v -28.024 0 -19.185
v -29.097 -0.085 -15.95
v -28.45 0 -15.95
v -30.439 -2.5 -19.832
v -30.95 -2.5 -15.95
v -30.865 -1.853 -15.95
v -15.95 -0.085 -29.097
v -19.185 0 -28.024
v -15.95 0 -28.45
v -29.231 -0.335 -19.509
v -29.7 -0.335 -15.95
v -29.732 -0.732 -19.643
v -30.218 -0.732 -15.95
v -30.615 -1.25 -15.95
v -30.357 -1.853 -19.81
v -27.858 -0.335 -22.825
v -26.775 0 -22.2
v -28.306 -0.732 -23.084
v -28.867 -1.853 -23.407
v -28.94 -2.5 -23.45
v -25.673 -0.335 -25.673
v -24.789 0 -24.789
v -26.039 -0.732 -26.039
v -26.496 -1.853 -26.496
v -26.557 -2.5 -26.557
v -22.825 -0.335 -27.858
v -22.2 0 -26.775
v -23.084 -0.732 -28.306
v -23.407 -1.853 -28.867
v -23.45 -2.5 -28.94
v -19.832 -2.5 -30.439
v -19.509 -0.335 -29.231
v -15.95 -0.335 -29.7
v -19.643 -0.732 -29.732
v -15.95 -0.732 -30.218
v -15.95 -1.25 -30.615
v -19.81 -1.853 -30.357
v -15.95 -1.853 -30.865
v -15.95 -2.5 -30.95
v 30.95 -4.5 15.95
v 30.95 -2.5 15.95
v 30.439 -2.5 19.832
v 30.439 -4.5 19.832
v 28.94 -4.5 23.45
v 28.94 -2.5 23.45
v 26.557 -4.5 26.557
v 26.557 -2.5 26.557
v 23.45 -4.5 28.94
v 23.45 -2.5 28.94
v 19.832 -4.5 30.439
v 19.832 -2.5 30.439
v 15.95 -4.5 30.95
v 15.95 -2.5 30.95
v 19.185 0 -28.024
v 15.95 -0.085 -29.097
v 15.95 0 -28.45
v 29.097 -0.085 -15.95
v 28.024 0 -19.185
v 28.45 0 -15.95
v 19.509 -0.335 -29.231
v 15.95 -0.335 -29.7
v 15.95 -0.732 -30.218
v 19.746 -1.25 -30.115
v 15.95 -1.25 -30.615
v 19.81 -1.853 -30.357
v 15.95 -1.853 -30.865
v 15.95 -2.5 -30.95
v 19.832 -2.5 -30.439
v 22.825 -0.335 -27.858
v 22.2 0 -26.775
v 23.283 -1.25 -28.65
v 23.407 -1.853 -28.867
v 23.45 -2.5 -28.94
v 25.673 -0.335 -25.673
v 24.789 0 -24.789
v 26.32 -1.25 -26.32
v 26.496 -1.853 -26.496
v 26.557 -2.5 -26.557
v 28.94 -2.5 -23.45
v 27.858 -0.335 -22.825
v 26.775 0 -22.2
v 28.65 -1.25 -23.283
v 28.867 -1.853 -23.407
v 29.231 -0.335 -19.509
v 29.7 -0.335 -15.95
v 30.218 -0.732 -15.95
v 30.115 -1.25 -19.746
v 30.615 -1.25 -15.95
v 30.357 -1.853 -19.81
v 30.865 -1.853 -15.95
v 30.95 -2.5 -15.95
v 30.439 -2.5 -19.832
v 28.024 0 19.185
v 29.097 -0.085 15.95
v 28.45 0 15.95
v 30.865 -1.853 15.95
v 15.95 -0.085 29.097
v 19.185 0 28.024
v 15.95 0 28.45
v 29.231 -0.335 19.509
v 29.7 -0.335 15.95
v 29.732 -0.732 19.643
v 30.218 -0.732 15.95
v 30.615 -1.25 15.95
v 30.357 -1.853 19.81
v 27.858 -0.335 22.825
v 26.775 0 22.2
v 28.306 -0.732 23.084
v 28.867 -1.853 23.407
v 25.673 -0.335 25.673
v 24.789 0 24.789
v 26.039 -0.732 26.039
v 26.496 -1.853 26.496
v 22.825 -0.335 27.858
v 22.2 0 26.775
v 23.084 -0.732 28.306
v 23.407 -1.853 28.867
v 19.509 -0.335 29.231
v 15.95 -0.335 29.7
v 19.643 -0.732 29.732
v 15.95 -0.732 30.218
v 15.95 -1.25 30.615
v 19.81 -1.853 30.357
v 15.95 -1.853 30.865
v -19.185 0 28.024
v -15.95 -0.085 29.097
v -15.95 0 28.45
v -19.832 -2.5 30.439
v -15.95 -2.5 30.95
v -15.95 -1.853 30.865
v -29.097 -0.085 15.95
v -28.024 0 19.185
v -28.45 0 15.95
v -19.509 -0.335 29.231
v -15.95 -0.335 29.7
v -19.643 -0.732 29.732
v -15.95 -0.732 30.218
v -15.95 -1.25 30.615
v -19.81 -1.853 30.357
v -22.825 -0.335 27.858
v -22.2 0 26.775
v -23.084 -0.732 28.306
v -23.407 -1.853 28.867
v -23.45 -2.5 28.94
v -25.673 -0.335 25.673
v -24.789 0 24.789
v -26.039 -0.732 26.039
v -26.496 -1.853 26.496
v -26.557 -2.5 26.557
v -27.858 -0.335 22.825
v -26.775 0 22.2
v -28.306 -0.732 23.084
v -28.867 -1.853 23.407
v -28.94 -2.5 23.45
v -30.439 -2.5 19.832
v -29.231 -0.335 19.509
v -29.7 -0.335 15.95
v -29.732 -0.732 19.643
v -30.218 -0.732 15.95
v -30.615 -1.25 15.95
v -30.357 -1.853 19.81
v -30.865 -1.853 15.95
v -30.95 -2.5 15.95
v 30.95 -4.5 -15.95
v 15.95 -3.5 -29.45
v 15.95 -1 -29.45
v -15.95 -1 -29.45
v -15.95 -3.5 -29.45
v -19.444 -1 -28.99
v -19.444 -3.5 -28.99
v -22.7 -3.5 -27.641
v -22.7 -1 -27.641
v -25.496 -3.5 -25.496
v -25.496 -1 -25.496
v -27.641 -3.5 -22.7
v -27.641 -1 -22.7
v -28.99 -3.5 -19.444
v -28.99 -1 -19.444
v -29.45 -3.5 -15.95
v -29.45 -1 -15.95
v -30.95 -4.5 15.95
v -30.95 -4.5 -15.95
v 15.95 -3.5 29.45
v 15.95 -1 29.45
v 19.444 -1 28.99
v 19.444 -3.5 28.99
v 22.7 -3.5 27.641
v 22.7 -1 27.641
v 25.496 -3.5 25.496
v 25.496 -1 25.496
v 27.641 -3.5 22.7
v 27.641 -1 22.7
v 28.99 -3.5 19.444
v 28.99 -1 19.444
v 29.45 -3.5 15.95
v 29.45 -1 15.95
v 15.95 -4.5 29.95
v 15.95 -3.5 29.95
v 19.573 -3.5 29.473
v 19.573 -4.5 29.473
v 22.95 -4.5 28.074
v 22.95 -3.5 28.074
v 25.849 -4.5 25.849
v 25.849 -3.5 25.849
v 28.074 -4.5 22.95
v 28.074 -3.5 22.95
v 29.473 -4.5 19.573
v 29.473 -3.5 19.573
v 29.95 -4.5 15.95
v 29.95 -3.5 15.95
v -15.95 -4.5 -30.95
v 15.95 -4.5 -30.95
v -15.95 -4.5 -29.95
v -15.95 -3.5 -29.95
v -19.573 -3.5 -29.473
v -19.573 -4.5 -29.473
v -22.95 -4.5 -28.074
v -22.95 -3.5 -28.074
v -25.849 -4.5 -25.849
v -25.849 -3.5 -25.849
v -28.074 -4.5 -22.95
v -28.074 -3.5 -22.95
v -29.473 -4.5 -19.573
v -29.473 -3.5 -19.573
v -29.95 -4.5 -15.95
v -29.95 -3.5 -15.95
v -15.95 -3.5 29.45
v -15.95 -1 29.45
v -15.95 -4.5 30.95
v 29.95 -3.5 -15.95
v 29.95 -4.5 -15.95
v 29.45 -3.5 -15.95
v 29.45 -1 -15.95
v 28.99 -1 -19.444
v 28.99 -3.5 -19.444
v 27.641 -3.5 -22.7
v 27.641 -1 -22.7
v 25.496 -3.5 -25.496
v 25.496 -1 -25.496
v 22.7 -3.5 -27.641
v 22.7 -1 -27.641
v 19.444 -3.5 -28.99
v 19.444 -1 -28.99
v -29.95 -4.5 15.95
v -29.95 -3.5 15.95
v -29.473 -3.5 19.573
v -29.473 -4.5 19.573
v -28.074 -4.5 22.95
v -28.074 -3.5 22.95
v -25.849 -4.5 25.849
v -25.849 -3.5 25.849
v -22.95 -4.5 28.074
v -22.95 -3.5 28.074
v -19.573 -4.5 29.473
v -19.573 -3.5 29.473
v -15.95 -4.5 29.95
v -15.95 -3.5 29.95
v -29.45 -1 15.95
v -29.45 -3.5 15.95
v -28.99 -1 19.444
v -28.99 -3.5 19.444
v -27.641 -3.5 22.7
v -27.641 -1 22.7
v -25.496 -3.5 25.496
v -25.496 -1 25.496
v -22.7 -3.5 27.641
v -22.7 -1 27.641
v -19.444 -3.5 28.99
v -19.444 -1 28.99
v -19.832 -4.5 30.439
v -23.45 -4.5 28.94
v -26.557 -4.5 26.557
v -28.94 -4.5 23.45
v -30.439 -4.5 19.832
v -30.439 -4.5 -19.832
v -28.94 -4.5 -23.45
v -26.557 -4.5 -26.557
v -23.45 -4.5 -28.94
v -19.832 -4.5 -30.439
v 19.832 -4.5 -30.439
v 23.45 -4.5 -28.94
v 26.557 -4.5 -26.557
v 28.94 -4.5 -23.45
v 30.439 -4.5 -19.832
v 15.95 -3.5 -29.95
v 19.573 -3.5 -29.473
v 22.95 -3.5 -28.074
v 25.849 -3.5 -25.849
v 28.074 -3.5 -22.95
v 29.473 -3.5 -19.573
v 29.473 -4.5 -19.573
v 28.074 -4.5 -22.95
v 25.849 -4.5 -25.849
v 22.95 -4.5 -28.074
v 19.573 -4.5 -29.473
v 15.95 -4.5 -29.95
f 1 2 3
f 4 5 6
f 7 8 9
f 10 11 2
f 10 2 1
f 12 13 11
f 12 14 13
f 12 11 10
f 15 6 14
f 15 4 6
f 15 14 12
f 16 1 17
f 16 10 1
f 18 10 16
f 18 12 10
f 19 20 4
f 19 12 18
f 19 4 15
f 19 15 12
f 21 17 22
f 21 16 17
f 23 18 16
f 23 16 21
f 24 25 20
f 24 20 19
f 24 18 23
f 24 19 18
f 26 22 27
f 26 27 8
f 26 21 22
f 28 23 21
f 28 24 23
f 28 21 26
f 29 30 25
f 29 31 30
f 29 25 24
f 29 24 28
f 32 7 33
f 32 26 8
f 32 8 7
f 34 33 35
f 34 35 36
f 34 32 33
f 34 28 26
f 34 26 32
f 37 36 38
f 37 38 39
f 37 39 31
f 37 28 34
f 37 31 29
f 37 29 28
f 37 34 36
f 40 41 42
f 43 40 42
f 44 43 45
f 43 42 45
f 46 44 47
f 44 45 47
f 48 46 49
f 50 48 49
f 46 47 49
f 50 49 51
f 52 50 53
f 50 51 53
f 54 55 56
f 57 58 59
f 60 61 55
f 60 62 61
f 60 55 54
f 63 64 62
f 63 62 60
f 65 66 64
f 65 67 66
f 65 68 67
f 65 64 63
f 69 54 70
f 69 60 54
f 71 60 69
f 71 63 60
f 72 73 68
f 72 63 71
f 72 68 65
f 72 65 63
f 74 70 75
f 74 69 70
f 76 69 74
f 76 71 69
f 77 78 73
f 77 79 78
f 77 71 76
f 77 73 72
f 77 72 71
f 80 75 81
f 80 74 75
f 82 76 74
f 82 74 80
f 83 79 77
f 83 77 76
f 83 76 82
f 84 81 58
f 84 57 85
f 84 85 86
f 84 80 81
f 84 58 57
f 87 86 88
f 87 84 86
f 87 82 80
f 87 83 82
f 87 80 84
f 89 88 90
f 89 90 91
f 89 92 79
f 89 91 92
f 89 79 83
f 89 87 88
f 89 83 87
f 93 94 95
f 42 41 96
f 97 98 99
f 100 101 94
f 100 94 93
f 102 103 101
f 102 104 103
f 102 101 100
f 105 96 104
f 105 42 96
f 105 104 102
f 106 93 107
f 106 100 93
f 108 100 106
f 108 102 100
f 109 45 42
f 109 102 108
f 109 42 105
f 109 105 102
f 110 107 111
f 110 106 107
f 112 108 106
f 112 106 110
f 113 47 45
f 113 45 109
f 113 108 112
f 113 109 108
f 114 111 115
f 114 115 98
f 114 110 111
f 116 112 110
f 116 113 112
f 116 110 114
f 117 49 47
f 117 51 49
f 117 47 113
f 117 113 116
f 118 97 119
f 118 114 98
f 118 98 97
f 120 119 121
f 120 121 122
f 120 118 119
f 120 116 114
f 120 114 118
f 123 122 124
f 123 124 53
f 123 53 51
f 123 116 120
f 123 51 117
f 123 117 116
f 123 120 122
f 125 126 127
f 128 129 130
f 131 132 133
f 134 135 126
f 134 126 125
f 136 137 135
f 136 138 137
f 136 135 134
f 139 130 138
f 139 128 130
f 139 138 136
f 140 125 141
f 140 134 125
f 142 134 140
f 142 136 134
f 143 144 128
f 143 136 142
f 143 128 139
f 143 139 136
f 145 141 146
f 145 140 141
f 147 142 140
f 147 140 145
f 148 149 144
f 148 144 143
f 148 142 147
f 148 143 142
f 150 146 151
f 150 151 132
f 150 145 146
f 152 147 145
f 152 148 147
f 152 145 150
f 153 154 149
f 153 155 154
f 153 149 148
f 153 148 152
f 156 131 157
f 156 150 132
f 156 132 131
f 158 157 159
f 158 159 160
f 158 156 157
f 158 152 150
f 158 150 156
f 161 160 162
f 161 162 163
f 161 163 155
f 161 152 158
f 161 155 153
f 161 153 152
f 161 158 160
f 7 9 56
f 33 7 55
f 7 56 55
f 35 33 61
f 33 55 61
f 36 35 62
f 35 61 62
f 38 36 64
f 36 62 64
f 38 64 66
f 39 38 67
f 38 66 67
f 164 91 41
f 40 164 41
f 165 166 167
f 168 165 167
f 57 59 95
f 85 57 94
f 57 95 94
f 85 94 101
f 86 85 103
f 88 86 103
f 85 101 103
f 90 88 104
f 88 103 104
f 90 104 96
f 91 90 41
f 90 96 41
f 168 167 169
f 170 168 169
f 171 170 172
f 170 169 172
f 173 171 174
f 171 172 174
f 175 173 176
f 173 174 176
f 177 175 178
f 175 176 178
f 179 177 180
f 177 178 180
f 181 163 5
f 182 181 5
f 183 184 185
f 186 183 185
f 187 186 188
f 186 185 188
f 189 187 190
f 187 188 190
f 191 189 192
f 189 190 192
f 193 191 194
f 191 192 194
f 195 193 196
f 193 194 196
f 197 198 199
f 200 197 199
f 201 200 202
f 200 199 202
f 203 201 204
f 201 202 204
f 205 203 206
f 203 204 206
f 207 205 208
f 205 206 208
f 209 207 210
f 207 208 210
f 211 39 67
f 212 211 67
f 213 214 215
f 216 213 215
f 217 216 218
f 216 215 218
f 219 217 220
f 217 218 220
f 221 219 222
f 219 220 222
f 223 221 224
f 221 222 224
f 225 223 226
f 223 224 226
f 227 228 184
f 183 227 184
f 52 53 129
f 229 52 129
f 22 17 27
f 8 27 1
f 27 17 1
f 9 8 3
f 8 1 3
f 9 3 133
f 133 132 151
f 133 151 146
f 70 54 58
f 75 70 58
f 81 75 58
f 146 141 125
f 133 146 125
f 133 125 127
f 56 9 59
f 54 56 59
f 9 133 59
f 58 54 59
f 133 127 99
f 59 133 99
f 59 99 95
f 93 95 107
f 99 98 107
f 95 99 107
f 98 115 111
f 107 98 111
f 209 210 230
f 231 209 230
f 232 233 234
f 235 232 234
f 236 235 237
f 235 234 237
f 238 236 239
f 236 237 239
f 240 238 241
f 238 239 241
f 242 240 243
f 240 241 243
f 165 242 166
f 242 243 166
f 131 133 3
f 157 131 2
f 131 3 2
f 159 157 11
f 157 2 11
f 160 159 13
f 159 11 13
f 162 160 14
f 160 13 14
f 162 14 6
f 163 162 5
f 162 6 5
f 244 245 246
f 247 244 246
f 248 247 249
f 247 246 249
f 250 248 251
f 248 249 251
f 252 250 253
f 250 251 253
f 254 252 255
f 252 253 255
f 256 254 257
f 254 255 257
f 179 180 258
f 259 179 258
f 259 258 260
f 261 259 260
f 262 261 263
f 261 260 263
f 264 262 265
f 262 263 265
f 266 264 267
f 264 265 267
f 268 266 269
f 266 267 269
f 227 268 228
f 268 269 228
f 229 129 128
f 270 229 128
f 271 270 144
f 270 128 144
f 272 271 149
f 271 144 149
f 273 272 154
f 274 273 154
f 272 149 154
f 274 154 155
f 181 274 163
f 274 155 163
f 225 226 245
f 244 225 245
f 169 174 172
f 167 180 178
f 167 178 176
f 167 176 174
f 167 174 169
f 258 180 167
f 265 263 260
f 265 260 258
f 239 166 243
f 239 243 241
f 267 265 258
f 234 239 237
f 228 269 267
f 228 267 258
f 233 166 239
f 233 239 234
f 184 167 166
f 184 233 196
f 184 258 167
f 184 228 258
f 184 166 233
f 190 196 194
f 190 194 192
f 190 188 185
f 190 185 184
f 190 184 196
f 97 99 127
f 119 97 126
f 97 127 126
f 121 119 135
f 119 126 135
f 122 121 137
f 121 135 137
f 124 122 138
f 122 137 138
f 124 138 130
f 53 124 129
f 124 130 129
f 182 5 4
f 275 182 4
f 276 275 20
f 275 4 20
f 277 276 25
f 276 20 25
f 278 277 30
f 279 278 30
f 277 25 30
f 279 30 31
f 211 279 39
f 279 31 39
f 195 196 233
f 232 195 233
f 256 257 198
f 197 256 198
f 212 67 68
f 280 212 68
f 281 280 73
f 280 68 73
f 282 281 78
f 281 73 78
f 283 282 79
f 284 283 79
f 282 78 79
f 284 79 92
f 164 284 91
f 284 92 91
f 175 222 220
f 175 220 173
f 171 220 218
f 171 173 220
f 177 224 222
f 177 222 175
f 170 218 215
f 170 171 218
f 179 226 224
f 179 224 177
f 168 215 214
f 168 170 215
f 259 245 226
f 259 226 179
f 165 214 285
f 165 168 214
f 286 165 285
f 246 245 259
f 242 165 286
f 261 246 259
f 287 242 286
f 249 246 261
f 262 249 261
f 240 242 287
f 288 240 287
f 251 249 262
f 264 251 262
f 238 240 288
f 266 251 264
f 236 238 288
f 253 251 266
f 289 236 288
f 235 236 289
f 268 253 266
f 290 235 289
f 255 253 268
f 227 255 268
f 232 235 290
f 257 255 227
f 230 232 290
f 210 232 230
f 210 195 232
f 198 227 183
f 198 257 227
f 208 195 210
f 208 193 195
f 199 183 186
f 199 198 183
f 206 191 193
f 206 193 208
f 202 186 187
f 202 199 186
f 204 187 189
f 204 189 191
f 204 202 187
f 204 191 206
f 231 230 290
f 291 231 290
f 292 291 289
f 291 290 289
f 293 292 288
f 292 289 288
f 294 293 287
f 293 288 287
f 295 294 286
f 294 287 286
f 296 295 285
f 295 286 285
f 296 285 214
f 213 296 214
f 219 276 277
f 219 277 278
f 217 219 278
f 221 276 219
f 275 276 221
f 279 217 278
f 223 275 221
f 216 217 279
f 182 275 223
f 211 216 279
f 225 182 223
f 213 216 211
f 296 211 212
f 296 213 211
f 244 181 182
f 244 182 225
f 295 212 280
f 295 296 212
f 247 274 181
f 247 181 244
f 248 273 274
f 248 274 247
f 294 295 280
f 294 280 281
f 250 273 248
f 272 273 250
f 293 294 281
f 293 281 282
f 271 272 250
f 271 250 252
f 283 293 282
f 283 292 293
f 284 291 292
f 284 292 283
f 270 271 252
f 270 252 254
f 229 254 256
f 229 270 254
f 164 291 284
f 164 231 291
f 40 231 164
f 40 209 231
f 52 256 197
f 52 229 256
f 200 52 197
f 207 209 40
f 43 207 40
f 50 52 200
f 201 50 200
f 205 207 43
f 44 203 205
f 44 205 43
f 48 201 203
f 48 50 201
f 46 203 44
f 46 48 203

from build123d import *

# Parameters (mm, degrees)
F1_DEPTH = 4.5
F2_DEPTH = 3.5
F3_DEPTH = 1
F4_R     = 2.5


with BuildPart() as f1:
    # F0 (on Front) → F1 (new body)
    with BuildSketch(Plane.XZ):
        with BuildLine():
            Line((15.95, 30.95), (-15.95, 30.95))
            ThreePointArc((-15.95, 30.95), (-26.556602, 26.556602), (-30.95, 15.95))
            Line((-30.95, 15.95), (-30.95, -15.95))
            ThreePointArc((-30.95, -15.95), (-26.556602, -26.556602), (-15.95, -30.95))
            Line((-15.95, -30.95), (15.95, -30.95))
            ThreePointArc((15.95, -30.95), (26.556602, -26.556602), (30.95, -15.95))
            Line((30.95, -15.95), (30.95, 15.95))
            ThreePointArc((30.95, 15.95), (26.556602, 26.556602), (15.95, 30.95))
        make_face()
        with BuildLine():
            ThreePointArc((-29.949999, 15.95), (-25.849494, 25.849494), (-15.95, 29.949999))
            Line((-15.95, 29.949999), (15.95, 29.949999))
            ThreePointArc((15.95, 29.949999), (25.849494, 25.849494), (29.949999, 15.95))
            Line((29.949999, 15.95), (29.949999, -15.95))
            ThreePointArc((29.949999, -15.95), (25.849494, -25.849494), (15.95, -29.949999))
            Line((15.95, -29.949999), (-15.95, -29.949999))
            ThreePointArc((-15.95, -29.949999), (-25.849494, -25.849494), (-29.949999, -15.95))
            Line((-29.949999, -15.95), (-29.949999, 15.95))
        make_face(mode=Mode.SUBTRACT)
    extrude(amount=F1_DEPTH)

    # F0 (on Front) → F2 (join)
    with BuildSketch(Plane.XZ):
        with BuildLine():
            Line((15.95, 29.949999), (-15.95, 29.949999))
            ThreePointArc((-15.95, 29.949999), (-25.849494, 25.849494), (-29.949999, 15.95))
            Line((-29.949999, 15.95), (-29.949999, -15.95))
            ThreePointArc((-29.949999, -15.95), (-25.849494, -25.849494), (-15.95, -29.949999))
            Line((-15.95, -29.949999), (15.95, -29.949999))
            ThreePointArc((15.95, -29.949999), (25.849494, -25.849494), (29.949999, -15.95))
            Line((29.949999, -15.95), (29.949999, 15.95))
            ThreePointArc((29.949999, 15.95), (25.849494, 25.849494), (15.95, 29.949999))
        make_face()
        with BuildLine():
            ThreePointArc((-29.45, 15.95), (-25.495942, 25.495942), (-15.95, 29.45))
            Line((-15.95, 29.45), (15.95, 29.45))
            ThreePointArc((15.95, 29.45), (25.495942, 25.495942), (29.45, 15.95))
            Line((29.45, 15.95), (29.45, -15.95))
            ThreePointArc((29.45, -15.95), (25.495942, -25.495942), (15.95, -29.45))
            Line((15.95, -29.45), (-15.95, -29.45))
            ThreePointArc((-15.95, -29.45), (-25.495942, -25.495942), (-29.45, -15.95))
            Line((-29.45, -15.95), (-29.45, 15.95))
        make_face(mode=Mode.SUBTRACT)
    extrude(amount=F2_DEPTH)

    # F0 (on Front) → F3 (join)
    with BuildSketch(Plane.XZ):
        with BuildLine():
            Line((15.95, 29.45), (-15.95, 29.45))
            ThreePointArc((-15.95, 29.45), (-25.495942, 25.495942), (-29.45, 15.95))
            Line((-29.45, 15.95), (-29.45, -15.95))
            ThreePointArc((-29.45, -15.95), (-25.495942, -25.495942), (-15.95, -29.45))
            Line((-15.95, -29.45), (15.95, -29.45))
            ThreePointArc((15.95, -29.45), (25.495942, -25.495942), (29.45, -15.95))
            Line((29.45, -15.95), (29.45, 15.95))
            ThreePointArc((29.45, 15.95), (25.495942, 25.495942), (15.95, 29.45))
        make_face()
    extrude(amount=F3_DEPTH)

    # F4
    f4_edges = [f1.edges().sort_by_distance(p)[0] for p in [
        (30.95, 0, 0),
    ]]
    fillet(f4_edges, radius=F4_R)


solid = f1.part
